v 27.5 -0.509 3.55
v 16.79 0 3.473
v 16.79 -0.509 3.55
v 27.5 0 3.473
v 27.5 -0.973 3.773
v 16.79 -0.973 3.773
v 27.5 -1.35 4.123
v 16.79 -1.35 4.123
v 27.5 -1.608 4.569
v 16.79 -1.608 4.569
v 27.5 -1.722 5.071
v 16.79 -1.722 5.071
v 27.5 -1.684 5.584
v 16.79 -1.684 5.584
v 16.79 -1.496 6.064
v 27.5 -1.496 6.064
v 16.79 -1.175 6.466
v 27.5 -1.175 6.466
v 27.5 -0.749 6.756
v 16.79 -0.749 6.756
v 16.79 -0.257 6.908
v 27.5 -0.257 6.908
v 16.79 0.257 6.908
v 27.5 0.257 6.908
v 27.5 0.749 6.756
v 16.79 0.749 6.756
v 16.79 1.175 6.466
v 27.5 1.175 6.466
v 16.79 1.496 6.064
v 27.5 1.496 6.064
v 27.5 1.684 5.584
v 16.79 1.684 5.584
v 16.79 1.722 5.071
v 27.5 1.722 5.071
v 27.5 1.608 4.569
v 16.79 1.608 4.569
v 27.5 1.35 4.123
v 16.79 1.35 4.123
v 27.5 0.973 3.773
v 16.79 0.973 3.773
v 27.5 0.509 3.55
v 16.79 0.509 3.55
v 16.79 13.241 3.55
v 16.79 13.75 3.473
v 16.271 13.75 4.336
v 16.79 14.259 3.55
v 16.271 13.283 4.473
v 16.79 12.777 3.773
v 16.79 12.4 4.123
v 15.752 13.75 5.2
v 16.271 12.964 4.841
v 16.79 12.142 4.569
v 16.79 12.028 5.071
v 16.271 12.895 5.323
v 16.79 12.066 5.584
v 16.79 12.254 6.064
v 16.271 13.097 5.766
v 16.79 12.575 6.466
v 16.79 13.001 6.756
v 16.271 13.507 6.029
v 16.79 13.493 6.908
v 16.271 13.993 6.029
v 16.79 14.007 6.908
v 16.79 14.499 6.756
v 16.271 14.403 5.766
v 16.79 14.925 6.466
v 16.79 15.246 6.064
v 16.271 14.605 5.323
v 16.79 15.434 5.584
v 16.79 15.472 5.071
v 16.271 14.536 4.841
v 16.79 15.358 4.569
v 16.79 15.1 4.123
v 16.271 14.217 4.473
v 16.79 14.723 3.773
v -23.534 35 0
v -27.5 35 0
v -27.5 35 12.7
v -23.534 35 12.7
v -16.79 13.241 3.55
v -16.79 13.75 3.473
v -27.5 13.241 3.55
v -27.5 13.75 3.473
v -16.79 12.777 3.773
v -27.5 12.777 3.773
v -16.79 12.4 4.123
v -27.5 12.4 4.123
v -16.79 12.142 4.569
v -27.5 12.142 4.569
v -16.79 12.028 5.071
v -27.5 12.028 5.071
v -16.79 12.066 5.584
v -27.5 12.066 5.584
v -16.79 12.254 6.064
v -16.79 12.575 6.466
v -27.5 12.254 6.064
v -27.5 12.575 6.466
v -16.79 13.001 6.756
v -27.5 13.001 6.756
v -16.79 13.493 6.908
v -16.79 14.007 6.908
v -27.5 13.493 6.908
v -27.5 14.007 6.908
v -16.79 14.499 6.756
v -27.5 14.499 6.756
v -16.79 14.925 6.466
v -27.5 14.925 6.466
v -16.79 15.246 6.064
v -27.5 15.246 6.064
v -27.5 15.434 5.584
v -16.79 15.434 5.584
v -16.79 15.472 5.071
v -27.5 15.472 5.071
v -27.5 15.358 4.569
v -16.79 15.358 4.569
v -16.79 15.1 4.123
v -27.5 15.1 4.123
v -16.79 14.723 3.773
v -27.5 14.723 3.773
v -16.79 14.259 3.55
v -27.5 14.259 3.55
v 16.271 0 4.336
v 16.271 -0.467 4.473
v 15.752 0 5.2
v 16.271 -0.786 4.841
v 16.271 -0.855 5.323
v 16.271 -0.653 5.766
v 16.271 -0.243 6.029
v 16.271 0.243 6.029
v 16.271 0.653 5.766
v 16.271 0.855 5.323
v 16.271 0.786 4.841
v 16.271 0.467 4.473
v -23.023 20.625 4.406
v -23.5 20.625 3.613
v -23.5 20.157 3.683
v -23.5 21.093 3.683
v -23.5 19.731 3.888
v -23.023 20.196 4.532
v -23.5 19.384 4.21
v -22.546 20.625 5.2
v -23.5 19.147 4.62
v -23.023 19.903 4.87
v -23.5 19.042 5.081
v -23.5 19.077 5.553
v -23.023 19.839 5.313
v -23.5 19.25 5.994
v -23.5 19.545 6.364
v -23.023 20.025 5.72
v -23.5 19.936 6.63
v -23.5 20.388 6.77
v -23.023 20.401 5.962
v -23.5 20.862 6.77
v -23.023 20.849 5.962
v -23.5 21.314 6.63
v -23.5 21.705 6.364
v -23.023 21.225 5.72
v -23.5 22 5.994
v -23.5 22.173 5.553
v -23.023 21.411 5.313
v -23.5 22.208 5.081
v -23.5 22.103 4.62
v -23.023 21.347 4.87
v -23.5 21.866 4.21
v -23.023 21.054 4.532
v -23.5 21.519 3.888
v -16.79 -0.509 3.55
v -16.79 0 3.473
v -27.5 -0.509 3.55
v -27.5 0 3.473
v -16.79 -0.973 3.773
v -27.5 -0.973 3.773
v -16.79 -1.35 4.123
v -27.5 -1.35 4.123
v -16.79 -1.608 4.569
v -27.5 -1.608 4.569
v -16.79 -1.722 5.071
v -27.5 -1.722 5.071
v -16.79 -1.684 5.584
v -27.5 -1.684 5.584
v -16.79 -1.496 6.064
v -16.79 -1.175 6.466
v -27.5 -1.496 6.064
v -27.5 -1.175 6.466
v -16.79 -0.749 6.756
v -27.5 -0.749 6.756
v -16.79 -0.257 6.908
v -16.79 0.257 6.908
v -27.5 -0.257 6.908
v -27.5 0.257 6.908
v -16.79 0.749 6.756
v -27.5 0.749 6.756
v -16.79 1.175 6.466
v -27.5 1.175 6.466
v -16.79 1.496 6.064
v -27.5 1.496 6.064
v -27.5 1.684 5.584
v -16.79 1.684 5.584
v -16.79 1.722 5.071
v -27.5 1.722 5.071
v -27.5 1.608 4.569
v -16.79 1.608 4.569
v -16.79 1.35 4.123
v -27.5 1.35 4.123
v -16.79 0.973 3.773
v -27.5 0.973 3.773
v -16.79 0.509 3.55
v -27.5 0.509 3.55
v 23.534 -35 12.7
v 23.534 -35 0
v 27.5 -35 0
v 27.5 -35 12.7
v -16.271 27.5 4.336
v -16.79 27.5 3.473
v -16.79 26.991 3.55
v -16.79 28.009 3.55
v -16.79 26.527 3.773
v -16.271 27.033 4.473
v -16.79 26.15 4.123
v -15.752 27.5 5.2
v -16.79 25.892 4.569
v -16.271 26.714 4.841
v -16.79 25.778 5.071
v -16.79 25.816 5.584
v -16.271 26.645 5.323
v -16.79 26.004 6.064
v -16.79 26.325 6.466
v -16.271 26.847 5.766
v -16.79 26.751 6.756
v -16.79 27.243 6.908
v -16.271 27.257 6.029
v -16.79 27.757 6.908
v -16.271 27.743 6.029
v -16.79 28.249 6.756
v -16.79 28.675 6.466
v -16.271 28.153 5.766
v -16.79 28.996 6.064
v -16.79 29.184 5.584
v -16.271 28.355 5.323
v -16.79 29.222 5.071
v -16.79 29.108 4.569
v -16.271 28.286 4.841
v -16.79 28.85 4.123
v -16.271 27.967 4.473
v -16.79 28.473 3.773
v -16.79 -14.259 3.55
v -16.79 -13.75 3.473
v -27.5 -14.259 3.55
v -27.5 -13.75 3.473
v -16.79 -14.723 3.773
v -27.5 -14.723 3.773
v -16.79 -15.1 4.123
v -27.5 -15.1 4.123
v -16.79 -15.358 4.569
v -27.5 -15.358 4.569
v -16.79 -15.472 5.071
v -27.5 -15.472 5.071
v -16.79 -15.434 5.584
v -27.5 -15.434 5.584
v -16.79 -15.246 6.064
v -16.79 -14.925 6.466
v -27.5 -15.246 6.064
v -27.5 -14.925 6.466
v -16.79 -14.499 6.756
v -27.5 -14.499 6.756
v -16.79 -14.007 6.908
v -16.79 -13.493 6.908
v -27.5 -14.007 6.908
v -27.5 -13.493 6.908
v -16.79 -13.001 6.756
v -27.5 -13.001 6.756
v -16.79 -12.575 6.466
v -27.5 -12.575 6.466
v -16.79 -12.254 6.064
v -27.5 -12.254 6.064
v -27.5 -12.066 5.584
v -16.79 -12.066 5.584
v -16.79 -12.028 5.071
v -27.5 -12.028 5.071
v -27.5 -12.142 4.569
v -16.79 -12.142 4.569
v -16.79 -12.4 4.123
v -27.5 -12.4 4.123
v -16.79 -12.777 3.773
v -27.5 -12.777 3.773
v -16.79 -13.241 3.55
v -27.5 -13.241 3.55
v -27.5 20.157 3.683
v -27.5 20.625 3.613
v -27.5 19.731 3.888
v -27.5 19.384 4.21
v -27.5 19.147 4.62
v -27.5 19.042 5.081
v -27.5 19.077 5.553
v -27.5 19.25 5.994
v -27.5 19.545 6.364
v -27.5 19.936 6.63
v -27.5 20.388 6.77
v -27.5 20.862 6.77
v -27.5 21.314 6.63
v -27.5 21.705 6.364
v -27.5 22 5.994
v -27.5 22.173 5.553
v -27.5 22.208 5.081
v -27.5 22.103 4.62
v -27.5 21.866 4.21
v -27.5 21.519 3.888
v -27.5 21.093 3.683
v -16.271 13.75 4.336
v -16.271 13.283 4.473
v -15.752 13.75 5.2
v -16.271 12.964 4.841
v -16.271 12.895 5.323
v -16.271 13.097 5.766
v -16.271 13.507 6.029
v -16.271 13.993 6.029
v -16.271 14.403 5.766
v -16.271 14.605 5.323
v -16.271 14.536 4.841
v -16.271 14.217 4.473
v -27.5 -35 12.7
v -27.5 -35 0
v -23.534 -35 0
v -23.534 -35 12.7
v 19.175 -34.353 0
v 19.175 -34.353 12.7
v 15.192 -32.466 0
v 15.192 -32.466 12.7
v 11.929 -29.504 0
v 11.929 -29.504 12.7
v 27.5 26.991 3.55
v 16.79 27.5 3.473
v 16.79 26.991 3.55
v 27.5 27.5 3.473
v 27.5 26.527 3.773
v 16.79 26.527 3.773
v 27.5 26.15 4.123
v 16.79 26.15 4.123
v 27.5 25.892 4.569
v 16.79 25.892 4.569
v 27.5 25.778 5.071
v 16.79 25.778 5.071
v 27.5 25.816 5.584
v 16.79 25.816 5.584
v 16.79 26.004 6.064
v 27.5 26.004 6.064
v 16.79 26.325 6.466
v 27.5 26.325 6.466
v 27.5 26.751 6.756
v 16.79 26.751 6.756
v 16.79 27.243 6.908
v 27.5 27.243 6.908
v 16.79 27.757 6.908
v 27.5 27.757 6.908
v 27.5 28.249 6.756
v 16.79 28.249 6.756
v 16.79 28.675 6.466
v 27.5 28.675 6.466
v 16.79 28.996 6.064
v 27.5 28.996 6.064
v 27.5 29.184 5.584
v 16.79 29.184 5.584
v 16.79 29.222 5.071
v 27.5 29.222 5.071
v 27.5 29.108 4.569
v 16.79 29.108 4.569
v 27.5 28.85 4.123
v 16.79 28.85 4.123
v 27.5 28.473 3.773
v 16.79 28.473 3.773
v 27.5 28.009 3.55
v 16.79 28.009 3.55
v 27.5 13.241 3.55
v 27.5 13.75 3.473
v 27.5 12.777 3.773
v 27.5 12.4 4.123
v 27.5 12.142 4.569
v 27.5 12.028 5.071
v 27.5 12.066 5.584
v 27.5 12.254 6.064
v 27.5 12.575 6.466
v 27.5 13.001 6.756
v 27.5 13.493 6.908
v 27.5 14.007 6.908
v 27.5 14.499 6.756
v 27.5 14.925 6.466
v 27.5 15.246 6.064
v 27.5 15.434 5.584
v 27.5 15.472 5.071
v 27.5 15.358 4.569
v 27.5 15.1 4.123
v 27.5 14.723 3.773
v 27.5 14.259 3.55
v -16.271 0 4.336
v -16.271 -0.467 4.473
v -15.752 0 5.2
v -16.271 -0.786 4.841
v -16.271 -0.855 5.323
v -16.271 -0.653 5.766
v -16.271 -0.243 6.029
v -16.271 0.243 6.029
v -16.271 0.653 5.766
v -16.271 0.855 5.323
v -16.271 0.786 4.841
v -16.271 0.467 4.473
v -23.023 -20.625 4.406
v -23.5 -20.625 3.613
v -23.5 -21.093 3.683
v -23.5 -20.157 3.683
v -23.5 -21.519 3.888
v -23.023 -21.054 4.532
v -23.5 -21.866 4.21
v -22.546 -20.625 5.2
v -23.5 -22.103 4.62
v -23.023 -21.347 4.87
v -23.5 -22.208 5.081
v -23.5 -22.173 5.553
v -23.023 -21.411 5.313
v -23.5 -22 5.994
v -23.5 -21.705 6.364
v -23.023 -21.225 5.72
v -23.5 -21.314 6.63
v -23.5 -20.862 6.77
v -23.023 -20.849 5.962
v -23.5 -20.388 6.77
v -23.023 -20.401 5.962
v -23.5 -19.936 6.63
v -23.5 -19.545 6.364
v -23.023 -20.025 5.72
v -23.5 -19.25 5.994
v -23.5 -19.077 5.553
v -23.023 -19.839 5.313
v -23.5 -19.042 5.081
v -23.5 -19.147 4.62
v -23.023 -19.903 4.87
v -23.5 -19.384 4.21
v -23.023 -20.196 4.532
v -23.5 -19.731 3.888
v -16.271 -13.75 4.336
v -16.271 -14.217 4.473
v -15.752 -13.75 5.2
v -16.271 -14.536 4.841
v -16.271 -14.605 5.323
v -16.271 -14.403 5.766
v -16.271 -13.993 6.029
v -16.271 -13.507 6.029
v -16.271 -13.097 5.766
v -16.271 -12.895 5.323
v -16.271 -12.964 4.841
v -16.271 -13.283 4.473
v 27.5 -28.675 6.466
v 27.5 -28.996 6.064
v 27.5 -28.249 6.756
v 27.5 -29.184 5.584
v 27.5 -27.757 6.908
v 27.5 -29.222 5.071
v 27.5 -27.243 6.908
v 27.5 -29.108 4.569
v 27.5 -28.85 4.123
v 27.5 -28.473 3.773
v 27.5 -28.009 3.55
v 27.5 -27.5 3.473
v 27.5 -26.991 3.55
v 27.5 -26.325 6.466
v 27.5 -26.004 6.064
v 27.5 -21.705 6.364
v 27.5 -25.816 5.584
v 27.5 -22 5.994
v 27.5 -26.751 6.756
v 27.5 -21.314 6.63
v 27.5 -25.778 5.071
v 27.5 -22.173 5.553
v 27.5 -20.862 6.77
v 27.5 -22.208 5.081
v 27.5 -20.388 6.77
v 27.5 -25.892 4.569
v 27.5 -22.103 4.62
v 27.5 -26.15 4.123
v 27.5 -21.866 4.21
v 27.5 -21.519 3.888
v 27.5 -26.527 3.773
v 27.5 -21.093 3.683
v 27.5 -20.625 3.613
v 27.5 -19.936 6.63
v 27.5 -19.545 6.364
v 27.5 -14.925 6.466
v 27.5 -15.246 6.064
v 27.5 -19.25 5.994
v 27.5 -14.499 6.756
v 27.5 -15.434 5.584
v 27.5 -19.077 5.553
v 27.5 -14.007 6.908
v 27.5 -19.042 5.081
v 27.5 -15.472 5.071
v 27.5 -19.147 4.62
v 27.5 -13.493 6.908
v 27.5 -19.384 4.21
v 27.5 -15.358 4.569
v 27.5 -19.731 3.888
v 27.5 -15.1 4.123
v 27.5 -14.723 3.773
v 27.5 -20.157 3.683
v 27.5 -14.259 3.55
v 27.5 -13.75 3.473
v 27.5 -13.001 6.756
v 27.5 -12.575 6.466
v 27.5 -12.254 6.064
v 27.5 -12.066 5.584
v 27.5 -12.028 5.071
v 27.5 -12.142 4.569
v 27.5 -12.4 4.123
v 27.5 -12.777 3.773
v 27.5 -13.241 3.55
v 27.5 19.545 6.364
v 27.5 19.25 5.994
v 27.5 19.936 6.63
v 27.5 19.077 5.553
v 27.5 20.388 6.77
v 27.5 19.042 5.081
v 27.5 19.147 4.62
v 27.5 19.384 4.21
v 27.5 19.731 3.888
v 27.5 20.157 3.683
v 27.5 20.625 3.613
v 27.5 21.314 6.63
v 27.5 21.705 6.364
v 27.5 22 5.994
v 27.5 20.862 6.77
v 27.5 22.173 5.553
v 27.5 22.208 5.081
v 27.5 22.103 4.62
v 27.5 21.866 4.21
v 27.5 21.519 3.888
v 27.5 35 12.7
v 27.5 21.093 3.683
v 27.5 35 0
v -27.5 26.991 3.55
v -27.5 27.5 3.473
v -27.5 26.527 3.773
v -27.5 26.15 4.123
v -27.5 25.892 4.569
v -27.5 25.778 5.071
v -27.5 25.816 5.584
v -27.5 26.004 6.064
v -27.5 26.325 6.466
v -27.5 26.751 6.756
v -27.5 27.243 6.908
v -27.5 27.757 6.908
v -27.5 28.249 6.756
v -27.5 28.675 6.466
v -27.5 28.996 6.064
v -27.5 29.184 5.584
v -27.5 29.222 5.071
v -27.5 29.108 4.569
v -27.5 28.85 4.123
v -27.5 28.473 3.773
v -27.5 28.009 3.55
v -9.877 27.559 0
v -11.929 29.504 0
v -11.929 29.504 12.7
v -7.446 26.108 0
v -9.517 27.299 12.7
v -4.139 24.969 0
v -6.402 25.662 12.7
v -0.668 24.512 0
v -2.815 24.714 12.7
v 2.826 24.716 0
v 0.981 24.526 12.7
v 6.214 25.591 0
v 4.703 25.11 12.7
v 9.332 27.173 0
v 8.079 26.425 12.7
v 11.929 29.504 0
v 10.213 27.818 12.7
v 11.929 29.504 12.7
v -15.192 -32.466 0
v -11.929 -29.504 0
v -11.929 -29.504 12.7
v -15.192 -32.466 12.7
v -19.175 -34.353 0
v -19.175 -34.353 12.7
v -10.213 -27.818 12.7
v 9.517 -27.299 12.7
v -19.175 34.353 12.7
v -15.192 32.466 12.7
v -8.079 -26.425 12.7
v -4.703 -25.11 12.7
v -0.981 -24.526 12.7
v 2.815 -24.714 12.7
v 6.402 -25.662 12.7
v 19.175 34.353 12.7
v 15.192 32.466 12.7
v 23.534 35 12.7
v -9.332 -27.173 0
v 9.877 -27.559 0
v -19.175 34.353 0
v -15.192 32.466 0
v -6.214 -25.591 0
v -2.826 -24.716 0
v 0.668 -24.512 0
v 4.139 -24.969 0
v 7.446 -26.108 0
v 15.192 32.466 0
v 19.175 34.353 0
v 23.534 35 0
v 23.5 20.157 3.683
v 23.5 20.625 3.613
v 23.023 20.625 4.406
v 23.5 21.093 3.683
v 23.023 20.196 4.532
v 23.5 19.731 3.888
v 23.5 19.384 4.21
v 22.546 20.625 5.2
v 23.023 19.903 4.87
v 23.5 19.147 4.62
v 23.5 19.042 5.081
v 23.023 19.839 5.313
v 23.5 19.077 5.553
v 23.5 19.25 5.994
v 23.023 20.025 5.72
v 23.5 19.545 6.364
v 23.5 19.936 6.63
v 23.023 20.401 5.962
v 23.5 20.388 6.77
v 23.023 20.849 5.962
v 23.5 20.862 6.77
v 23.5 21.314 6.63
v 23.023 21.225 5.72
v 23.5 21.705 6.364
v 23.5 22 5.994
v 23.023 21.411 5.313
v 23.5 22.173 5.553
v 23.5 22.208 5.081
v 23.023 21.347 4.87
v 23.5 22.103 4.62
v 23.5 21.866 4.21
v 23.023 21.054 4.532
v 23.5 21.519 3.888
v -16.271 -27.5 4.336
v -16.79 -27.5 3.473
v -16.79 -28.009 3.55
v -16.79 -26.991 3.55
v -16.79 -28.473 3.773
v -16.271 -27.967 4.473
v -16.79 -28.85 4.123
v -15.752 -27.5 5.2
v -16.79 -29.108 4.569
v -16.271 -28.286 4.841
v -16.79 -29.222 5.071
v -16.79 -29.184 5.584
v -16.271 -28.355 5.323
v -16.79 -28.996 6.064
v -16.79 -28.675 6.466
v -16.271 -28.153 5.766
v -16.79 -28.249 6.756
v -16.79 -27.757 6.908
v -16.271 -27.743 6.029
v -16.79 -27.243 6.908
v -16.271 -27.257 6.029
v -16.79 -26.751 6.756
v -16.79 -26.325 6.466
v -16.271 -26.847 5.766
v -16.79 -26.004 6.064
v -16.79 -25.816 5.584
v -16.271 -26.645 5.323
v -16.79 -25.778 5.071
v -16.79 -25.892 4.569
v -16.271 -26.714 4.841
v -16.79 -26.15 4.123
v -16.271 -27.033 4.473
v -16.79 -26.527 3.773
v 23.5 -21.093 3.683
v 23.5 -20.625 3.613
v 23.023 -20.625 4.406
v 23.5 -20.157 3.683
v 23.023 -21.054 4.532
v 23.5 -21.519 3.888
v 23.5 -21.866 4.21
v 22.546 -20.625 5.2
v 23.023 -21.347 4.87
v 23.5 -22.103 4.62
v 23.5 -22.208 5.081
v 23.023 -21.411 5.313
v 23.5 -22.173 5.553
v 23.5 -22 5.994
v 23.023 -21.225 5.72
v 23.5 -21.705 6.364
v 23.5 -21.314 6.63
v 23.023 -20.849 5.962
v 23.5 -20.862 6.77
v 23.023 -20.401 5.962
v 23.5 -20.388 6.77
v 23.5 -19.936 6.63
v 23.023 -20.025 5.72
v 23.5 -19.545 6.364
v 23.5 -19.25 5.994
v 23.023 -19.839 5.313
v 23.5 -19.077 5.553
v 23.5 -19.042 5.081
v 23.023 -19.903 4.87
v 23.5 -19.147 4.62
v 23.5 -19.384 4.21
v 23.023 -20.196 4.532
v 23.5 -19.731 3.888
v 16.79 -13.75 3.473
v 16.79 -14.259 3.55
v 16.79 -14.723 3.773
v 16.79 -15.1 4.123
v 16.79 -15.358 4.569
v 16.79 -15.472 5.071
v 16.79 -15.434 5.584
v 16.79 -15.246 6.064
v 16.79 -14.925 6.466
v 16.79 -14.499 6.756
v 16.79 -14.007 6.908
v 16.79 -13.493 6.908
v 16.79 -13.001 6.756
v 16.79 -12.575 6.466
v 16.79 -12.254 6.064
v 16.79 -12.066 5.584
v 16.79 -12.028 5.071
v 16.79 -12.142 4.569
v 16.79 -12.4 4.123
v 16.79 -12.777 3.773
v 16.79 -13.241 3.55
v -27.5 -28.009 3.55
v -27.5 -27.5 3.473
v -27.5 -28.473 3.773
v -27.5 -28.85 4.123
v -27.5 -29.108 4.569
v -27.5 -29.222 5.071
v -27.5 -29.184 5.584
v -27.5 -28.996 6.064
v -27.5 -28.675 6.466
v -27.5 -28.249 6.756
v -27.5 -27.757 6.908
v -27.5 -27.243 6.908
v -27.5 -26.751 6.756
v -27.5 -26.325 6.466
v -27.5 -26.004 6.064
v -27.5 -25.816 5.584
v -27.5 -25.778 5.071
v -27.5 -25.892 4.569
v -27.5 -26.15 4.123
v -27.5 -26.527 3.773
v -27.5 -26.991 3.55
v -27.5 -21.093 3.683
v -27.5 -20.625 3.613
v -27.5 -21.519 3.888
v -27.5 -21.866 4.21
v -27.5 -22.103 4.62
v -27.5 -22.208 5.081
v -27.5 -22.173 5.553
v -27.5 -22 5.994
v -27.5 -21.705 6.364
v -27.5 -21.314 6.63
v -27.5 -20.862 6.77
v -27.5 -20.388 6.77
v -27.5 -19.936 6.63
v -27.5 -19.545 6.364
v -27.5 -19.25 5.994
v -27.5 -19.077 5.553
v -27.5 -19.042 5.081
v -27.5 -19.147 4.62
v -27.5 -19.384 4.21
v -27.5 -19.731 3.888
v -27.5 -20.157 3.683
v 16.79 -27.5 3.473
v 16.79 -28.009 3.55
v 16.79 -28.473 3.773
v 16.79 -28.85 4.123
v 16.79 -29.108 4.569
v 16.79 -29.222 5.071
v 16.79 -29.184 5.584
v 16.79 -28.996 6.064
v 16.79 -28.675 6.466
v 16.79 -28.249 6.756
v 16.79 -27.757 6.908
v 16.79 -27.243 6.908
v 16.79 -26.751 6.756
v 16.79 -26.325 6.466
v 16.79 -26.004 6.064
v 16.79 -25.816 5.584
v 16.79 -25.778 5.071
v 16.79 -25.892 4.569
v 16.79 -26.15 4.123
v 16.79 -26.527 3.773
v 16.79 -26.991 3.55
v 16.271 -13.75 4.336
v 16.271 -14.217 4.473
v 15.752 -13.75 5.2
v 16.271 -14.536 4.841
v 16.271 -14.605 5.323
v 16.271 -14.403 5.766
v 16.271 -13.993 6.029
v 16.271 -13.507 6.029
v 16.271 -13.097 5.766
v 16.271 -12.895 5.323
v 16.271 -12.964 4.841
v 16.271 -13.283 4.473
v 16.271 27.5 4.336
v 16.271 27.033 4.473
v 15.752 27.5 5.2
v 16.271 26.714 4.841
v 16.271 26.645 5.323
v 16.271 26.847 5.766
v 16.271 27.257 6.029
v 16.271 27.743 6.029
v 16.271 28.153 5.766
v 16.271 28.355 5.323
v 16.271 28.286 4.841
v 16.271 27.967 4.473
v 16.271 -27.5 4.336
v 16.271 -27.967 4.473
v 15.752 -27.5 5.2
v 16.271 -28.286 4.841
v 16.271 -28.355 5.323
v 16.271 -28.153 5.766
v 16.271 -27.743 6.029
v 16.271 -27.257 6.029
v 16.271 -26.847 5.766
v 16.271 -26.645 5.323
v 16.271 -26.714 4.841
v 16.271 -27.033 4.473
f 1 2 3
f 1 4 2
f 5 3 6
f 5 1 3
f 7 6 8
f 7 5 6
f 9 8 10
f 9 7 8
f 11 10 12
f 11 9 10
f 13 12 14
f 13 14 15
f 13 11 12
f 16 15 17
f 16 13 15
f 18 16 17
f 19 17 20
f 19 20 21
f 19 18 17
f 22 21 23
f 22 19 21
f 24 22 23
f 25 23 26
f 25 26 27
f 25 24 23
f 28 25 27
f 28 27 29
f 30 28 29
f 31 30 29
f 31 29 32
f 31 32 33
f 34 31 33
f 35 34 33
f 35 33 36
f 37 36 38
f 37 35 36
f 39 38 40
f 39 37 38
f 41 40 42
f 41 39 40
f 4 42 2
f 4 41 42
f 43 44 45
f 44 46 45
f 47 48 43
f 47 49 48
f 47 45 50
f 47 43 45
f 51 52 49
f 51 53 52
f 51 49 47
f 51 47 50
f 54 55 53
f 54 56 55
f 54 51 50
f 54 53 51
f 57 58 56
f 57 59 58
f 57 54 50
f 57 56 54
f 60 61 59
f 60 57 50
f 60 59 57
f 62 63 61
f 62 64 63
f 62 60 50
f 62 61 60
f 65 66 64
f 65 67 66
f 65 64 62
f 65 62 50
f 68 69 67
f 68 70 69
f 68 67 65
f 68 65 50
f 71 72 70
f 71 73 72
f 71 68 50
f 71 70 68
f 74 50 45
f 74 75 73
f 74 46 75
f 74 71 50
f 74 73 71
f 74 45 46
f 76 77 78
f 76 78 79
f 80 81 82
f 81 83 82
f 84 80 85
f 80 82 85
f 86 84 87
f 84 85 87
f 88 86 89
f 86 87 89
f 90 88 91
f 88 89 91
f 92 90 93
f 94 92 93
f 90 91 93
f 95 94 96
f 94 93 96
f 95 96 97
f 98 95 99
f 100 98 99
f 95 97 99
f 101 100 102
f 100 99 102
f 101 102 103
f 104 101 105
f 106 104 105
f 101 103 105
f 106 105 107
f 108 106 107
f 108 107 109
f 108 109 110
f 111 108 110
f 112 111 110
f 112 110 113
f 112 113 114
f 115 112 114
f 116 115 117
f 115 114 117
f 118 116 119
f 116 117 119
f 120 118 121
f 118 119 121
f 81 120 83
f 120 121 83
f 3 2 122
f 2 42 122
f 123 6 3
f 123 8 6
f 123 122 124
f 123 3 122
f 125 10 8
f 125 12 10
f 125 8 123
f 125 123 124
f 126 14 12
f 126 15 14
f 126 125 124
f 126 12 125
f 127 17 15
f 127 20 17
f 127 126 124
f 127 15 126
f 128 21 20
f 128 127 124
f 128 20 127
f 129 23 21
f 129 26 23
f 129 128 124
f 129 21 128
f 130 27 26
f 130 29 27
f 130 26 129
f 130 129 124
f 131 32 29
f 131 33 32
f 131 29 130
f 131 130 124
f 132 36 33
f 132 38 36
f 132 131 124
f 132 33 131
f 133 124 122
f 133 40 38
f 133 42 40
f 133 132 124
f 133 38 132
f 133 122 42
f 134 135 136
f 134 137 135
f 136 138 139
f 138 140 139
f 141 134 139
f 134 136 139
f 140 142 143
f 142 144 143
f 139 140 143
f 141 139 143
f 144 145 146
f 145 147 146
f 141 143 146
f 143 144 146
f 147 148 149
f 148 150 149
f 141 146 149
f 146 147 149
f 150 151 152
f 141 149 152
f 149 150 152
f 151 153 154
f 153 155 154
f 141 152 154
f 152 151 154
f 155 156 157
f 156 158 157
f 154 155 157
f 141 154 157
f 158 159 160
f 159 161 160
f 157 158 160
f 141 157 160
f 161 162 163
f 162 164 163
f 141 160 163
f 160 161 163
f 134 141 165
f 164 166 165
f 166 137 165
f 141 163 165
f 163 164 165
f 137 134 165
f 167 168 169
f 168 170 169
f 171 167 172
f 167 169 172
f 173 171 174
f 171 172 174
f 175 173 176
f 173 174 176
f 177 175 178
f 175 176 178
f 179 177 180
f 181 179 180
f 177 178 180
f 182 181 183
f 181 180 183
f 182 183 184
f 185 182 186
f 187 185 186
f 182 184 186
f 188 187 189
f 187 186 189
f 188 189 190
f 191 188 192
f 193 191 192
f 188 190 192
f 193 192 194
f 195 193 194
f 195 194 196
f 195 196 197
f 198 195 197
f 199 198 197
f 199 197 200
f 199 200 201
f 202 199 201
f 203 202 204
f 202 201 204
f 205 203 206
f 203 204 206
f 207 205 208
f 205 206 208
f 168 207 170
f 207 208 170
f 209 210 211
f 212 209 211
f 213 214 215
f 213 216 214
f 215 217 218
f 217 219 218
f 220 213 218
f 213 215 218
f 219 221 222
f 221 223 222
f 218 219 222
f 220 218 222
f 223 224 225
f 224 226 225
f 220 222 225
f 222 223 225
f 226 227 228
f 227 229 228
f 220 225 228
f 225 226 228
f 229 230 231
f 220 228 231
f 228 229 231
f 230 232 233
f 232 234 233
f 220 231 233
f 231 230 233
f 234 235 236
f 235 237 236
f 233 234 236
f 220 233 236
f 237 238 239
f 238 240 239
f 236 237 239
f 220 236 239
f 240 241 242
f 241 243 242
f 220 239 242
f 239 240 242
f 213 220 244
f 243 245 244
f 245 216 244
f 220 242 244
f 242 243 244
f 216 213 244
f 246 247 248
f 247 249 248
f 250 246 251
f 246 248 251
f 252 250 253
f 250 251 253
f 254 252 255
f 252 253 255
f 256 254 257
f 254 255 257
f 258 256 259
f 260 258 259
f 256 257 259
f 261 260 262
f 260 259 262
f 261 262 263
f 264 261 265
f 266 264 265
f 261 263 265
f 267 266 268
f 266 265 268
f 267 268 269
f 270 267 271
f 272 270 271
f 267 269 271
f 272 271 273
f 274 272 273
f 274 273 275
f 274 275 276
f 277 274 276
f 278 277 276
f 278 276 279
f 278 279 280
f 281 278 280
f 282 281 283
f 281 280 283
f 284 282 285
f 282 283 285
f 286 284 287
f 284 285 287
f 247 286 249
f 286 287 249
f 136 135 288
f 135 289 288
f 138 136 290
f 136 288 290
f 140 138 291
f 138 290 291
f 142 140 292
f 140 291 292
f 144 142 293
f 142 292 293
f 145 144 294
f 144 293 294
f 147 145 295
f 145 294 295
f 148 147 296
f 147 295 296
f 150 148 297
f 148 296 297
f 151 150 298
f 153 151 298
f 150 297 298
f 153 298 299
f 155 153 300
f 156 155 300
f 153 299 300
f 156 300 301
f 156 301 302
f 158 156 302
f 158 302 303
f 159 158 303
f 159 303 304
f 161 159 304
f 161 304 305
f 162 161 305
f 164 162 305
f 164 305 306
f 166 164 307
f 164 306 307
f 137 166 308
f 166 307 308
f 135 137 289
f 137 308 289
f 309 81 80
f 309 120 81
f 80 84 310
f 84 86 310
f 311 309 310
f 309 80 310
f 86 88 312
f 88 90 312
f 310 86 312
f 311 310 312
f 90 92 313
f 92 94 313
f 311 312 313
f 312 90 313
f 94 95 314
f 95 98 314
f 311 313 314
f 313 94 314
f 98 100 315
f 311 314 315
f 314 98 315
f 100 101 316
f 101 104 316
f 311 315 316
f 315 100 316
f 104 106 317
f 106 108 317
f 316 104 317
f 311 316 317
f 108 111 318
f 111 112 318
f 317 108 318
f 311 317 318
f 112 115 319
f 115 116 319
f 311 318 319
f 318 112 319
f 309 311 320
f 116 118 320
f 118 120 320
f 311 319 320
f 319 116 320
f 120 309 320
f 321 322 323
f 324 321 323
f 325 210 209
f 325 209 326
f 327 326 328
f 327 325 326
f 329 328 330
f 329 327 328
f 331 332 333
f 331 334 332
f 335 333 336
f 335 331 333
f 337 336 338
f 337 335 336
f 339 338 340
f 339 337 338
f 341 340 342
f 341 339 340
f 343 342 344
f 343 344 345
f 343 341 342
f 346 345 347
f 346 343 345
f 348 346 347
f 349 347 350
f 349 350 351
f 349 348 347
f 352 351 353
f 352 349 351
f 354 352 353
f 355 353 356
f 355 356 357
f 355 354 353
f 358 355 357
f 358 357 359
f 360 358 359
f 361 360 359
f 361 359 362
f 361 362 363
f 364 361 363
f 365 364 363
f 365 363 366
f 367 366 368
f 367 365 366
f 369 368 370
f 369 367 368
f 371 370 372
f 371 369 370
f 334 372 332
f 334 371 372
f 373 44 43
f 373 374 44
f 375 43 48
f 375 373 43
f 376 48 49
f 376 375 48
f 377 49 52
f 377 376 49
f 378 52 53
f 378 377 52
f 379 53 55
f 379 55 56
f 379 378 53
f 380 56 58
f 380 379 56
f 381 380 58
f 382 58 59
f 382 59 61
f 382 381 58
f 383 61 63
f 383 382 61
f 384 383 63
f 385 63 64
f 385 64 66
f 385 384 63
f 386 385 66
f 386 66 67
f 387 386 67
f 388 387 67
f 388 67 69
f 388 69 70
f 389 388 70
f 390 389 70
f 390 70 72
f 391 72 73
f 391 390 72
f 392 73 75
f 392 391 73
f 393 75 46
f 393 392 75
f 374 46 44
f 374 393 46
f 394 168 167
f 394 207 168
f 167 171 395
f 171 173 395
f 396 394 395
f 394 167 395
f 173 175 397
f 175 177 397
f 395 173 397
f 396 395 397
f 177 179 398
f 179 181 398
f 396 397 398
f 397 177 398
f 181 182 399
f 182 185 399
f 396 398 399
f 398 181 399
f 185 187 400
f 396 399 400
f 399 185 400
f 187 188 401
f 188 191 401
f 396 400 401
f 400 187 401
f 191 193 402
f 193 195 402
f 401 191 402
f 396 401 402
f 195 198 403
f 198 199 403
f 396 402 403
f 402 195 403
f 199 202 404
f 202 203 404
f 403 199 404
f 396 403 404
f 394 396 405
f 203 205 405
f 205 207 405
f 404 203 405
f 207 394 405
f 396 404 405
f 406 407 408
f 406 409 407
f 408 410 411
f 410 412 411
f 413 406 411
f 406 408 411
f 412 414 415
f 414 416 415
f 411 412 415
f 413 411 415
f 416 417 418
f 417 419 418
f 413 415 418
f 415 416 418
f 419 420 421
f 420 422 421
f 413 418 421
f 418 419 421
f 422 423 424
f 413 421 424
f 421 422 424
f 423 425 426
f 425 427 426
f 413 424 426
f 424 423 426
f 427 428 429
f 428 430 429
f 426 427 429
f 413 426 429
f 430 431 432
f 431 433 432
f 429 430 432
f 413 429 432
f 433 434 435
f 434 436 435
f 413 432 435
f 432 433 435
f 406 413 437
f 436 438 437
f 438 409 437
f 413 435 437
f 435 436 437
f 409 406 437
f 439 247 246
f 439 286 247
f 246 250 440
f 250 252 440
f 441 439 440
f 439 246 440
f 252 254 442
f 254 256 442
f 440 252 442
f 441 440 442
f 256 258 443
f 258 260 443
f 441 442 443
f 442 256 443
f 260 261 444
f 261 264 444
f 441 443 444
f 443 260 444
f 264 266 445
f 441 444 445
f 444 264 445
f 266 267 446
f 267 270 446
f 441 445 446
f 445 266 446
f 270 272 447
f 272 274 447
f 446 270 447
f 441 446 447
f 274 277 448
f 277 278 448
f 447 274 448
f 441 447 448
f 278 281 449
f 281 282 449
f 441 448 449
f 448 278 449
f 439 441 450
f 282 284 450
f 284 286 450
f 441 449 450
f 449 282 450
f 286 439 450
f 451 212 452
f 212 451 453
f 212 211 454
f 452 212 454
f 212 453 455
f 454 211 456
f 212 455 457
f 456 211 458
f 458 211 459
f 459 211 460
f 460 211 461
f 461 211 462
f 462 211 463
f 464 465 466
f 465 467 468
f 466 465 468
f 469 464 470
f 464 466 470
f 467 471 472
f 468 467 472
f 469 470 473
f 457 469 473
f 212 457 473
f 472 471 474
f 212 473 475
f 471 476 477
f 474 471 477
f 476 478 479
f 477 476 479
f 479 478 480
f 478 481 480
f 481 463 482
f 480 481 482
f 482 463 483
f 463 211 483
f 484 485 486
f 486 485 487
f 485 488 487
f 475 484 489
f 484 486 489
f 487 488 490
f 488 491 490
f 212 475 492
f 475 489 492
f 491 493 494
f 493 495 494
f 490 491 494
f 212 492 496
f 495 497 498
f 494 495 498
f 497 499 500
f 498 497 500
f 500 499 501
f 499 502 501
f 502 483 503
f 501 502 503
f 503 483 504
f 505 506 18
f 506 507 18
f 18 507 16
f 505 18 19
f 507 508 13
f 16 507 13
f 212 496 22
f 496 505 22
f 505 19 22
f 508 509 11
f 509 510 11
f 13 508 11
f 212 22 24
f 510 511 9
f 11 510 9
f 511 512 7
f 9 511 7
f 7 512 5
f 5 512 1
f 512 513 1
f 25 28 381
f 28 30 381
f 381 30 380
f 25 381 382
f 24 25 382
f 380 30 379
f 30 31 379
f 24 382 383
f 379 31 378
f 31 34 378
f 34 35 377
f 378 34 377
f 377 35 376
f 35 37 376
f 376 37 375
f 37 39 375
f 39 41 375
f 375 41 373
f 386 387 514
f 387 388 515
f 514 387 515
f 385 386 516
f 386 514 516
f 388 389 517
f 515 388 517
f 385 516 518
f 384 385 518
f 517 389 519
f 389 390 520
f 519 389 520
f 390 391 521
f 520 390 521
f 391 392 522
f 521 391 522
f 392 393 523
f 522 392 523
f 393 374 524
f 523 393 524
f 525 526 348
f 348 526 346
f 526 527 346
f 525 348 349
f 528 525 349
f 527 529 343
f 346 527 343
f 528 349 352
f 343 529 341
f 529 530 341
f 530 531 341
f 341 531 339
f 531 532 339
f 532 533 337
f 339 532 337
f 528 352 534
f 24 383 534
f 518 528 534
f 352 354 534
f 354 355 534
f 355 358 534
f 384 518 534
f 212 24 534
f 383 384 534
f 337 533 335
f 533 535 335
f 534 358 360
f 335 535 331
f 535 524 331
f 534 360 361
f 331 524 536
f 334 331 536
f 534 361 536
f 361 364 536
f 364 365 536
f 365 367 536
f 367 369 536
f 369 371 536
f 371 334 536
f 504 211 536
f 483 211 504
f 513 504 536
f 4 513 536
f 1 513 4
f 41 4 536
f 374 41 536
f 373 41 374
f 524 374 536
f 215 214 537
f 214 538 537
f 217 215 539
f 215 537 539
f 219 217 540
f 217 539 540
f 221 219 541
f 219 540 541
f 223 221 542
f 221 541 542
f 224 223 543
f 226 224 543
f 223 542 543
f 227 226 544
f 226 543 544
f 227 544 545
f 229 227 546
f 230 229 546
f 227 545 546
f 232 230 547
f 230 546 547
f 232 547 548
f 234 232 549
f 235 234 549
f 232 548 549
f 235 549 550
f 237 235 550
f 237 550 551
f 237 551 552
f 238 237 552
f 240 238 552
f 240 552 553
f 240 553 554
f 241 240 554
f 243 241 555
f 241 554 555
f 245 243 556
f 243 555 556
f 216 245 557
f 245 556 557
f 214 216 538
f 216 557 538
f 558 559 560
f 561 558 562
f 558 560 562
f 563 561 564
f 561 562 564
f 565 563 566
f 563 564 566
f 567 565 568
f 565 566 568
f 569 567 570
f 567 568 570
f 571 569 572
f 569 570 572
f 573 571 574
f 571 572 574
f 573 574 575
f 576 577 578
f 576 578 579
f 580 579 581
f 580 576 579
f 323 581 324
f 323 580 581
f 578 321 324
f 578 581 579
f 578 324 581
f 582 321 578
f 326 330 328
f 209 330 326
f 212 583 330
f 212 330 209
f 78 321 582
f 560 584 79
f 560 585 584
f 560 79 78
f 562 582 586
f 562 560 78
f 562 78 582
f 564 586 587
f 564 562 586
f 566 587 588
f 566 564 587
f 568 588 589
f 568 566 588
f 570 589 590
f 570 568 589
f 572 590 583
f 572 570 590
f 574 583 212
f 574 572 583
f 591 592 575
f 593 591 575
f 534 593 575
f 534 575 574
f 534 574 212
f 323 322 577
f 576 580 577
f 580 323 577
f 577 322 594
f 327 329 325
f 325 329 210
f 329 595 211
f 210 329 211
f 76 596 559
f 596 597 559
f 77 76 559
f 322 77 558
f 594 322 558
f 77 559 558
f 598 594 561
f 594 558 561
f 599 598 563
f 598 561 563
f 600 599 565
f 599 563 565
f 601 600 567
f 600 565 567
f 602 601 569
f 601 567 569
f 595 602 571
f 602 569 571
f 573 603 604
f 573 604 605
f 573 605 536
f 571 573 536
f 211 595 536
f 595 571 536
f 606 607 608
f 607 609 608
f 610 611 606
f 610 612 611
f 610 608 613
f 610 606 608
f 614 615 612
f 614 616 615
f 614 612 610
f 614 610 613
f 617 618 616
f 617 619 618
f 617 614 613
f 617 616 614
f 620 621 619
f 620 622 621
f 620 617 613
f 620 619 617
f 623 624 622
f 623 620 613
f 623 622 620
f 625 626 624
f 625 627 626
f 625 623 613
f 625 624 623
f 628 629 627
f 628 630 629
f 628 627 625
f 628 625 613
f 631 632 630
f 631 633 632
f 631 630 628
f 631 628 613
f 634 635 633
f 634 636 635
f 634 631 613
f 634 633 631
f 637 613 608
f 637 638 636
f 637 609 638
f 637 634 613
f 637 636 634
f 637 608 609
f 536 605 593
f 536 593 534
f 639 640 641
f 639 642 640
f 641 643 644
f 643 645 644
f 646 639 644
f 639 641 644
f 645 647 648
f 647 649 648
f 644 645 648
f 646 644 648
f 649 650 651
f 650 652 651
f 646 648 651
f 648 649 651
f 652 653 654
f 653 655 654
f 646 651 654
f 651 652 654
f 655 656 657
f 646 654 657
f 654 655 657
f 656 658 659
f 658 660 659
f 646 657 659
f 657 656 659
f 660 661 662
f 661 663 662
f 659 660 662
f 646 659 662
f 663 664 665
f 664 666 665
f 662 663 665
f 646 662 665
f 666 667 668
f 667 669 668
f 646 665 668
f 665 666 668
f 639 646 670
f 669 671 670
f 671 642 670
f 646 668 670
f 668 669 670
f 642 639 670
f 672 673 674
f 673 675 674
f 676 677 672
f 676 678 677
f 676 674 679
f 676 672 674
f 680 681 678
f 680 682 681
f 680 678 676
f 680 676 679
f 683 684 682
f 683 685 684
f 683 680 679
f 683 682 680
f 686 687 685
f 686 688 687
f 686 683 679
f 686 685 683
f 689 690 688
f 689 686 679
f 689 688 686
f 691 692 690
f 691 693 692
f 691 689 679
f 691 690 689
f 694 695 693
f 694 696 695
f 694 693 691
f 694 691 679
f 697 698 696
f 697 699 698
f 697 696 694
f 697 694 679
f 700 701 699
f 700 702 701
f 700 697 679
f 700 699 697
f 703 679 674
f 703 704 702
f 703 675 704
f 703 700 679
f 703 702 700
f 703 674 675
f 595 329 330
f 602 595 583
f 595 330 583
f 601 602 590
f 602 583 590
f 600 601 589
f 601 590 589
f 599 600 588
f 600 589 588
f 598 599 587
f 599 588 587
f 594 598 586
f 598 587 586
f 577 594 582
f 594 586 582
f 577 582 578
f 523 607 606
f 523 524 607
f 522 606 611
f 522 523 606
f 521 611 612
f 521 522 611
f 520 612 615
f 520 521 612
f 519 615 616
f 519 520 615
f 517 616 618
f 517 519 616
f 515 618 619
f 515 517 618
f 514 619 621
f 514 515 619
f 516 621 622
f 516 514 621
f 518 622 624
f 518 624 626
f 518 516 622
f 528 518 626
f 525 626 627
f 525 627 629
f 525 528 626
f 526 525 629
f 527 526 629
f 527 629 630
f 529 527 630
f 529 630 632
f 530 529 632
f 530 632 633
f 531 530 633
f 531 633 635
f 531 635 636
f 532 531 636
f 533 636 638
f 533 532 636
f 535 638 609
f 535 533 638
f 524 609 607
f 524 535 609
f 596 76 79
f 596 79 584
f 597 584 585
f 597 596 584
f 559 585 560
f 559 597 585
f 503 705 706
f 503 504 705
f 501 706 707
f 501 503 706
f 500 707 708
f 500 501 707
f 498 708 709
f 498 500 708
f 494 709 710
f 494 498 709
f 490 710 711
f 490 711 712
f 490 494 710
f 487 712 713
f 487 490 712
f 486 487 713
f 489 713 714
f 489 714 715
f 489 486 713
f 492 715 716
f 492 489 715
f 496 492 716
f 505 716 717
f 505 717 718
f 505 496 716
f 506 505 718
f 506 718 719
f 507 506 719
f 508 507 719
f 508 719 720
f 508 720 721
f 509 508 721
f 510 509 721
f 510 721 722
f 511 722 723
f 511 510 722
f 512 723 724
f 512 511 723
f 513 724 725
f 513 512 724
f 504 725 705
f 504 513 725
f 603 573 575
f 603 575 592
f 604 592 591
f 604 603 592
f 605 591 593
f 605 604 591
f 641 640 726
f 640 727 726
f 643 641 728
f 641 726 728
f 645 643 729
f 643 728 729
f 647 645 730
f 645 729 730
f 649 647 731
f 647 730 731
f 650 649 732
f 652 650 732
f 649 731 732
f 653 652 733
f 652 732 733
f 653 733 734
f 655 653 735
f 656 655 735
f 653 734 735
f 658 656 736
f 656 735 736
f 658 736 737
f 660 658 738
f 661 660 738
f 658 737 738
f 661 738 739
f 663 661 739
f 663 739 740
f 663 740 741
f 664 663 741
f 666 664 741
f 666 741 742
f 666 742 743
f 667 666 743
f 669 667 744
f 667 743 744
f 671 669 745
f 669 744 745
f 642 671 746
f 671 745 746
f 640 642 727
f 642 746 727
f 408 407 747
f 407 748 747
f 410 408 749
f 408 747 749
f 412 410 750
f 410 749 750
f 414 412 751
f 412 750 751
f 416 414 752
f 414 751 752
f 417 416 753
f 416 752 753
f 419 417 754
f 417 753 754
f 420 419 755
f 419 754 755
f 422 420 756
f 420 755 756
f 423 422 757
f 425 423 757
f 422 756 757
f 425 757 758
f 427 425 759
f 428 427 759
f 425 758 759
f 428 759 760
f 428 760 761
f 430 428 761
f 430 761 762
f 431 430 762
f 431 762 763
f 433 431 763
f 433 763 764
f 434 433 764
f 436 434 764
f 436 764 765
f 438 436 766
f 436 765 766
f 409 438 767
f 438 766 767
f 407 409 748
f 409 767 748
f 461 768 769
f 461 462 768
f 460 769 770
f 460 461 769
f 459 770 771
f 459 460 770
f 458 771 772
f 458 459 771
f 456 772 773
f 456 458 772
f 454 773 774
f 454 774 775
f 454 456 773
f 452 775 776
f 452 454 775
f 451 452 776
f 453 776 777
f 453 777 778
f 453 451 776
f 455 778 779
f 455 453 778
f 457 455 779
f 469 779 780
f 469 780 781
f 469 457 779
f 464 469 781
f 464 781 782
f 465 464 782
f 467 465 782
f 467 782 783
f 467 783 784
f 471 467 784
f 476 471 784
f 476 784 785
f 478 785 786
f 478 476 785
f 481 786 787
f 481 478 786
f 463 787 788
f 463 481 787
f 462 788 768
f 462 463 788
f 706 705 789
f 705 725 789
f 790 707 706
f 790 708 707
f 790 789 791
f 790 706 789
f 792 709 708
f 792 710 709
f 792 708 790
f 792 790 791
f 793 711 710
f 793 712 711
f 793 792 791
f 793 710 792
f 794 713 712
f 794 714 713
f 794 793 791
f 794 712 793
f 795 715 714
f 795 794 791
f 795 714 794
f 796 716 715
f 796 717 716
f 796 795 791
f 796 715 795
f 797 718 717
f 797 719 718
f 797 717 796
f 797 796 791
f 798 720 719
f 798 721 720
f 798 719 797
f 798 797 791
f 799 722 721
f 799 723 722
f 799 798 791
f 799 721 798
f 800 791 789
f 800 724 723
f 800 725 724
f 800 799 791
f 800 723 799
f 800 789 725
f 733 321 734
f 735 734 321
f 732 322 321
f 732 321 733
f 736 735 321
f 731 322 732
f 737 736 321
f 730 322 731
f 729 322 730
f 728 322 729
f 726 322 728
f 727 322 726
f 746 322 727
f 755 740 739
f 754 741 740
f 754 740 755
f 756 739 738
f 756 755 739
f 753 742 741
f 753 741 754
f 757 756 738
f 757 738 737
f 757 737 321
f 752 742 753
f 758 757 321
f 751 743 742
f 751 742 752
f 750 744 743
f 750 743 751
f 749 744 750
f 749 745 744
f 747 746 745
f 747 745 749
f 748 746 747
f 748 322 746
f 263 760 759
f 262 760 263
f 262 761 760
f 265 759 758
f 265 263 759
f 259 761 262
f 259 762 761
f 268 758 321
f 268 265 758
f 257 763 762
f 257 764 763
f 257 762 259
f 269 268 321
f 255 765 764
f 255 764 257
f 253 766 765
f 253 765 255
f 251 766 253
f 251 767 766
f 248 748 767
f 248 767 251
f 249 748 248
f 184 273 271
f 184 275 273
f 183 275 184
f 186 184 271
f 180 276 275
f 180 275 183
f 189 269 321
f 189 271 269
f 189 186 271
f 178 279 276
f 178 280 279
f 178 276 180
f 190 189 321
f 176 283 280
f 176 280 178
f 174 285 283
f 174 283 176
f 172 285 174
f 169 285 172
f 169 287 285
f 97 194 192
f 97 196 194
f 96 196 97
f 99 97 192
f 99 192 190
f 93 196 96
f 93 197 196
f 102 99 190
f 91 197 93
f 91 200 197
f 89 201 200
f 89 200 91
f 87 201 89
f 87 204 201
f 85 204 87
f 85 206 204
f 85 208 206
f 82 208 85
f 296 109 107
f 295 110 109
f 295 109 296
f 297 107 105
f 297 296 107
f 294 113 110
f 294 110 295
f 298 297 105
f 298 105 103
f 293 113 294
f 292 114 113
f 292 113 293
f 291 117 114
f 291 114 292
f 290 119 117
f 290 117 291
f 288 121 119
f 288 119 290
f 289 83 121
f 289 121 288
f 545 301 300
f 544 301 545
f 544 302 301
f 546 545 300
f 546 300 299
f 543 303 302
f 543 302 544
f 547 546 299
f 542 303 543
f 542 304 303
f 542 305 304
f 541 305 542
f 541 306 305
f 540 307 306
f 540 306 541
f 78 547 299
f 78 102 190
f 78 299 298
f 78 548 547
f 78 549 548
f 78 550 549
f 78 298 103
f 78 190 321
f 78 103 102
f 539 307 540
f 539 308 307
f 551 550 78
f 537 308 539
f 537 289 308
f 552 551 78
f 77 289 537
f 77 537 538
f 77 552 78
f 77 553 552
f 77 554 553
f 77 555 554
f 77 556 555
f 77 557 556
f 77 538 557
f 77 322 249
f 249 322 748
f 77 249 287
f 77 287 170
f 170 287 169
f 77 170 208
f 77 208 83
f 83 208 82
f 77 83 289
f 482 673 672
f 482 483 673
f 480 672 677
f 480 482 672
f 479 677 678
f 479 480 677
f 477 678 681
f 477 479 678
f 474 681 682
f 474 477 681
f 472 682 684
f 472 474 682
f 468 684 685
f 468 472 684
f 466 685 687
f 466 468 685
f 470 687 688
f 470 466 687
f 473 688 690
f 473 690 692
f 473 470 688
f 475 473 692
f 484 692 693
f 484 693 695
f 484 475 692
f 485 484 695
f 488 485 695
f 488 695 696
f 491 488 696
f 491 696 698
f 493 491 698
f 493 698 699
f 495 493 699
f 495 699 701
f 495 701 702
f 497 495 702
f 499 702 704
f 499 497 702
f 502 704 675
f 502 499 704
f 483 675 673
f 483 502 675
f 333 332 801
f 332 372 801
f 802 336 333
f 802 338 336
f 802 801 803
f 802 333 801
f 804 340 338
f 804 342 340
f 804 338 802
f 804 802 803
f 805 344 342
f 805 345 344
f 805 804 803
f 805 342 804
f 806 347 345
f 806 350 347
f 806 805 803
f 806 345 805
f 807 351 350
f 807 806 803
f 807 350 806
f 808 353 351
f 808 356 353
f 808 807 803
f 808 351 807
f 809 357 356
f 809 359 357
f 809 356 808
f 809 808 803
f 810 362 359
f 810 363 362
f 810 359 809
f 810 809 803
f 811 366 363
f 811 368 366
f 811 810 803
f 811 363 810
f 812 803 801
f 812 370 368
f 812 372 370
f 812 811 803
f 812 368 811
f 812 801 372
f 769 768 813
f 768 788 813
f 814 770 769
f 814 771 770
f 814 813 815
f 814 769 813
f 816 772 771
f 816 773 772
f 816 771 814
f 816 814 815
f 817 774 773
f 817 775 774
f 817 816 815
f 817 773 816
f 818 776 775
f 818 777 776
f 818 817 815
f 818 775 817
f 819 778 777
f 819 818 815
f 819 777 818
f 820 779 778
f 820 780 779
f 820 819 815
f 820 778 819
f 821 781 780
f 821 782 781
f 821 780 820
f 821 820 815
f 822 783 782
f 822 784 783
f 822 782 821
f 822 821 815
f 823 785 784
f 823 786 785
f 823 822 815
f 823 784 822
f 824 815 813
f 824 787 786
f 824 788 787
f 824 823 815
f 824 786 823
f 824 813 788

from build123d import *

# Parameters (mm, degrees)
SKETCH1_W                           = 55
SKETCH1_H                           = 70
BOSS_EXTRUDE1_DEPTH                 = 12.7
SKETCH21_RX                         = 14
SKETCH21_RY                         = 10.5
CUT_EXTRUDE1_DEPTH                  = 47.287579328
FILLET2_START                       = -1
FILLET2_DEPTH                       = 15
F_8_32_TAPPED_HOLE1_AT_2_COUNT      = 2
F_8_32_TAPPED_HOLE1_AT_2_PITCH      = 13.75
F_8_32_TAPPED_HOLE1_AT_3_COUNT      = 2
F_8_32_TAPPED_HOLE1_AT_3_PITCH      = 27.5
F_8_32_TAPPED_HOLE1_AT_4_COUNT      = 2
F_8_32_TAPPED_HOLE1_AT_4_PITCH      = 55
F_8_32_TAPPED_HOLE1_AT_5_COUNT      = 2
F_8_32_TAPPED_HOLE1_AT_5_PITCH      = 41.25
F_1_8_0_1250_DOWEL_HOLE1_AT_2_COUNT = 2
F_1_8_0_1250_DOWEL_HOLE1_AT_2_PITCH = 41.25


with BuildPart() as part:
    # Sketch1 → Boss-Extrude1 (new body)
    with BuildSketch(Plane.XY):
        Rectangle(SKETCH1_W, SKETCH1_H)
    extrude(amount=BOSS_EXTRUDE1_DEPTH)

    # Sketch21 → Cut-Extrude1 (cut, through all)
    with BuildSketch(Plane.XY.offset(12.7)):
        with Locations((0, 35)):
            Ellipse(SKETCH21_RX, SKETCH21_RY)
        with Locations((0, -35)):
            Ellipse(SKETCH21_RX, SKETCH21_RY)
    extrude(amount=-CUT_EXTRUDE1_DEPTH, mode=Mode.SUBTRACT)

    # Fillet2: read off the stored shape, not the designer's step
    # Fillet2 outline → Fillet2 (cut)
    with BuildSketch(Plane.XY.offset(FILLET2_START)):
        with BuildLine():
            ThreePointArc((-23.533885883, 35), (-17.113783845, 33.556632687), (-11.929223863, 29.504305309))
            add(Edge.make_bspline(
                [(-14, 35), (-14, 32.032702325), (-11.929223863, 29.504305309)],
                knots=[3.141592654, 3.141592654, 3.141592654, 3.703586408, 3.703586408, 3.703586408], degree=2, weights=[1, 0.895209737, 0.865402427]))
            Line((-14, 35), (-23.533885883, 35))
        make_face()
        with BuildLine():
            add(Edge.make_bspline(
                [(11.929223863, 29.504305309), (14, 32.032702325), (14, 35)],
                knots=[5.721191552, 5.721191552, 5.721191552, 6.283185307, 6.283185307, 6.283185307], degree=2, weights=[0.865402427, 0.895209737, 1]))
            ThreePointArc((11.929223863, 29.504305309), (17.113783845, 33.556632687), (23.533885883, 35))
            Line((23.533885883, 35), (14, 35))
        make_face()
        with BuildLine():
            ThreePointArc((23.533885883, -35), (17.113783845, -33.556632687), (11.929223863, -29.504305309))
            add(Edge.make_bspline(
                [(14, -35), (14, -32.032702325), (11.929223863, -29.504305309)],
                knots=[0, 0, 0, 0.561993755, 0.561993755, 0.561993755], degree=2, weights=[1, 0.895209737, 0.865402427]))
            Line((14, -35), (23.533885883, -35))
        make_face()
        with BuildLine():
            add(Edge.make_bspline(
                [(-11.929223863, -29.504305309), (-14, -32.032702325), (-14, -35)],
                knots=[2.579598899, 2.579598899, 2.579598899, 3.141592654, 3.141592654, 3.141592654], degree=2, weights=[0.865402427, 0.895209737, 1]))
            ThreePointArc((-11.929223863, -29.504305309), (-17.113783845, -33.556632687), (-23.533885883, -35))
            Line((-23.533885883, -35), (-14, -35))
        make_face()
    extrude(amount=FILLET2_DEPTH, mode=Mode.SUBTRACT)

    # Sketch16 → #8-32 Tapped Hole1 (revolve, cut)
    with BuildSketch(Plane(origin=(27.5, -27.5, 5.2), x_dir=(0, 0, -1), z_dir=(0, 1, 0))):
        Polygon((0, 0), (0, 11.747806461), (1.7272, 10.71), (1.7272, 0), align=None)
    f_8_32_tapped_hole1 = revolve(axis=Axis((33.85, -27.5, 5.2), (-1, 0, 0)), mode=Mode.SUBTRACT)

    # #8-32 Tapped Hole1 at 2: #8-32 Tapped Hole1 ×2
    with Locations(*[(0, i * F_8_32_TAPPED_HOLE1_AT_2_PITCH, 0) for i in range(1, F_8_32_TAPPED_HOLE1_AT_2_COUNT)]):
        add(f_8_32_tapped_hole1, mode=Mode.SUBTRACT)

    # #8-32 Tapped Hole1 at 3: #8-32 Tapped Hole1 ×2
    with Locations(*[(0, i * F_8_32_TAPPED_HOLE1_AT_3_PITCH, 0) for i in range(1, F_8_32_TAPPED_HOLE1_AT_3_COUNT)]):
        add(f_8_32_tapped_hole1, mode=Mode.SUBTRACT)

    # #8-32 Tapped Hole1 at 4: #8-32 Tapped Hole1 ×2
    with Locations(*[(0, i * F_8_32_TAPPED_HOLE1_AT_4_PITCH, 0) for i in range(1, F_8_32_TAPPED_HOLE1_AT_4_COUNT)]):
        add(f_8_32_tapped_hole1, mode=Mode.SUBTRACT)

    # #8-32 Tapped Hole1 at 5: #8-32 Tapped Hole1 ×2
    with Locations(*[(0, i * F_8_32_TAPPED_HOLE1_AT_5_PITCH, 0) for i in range(1, F_8_32_TAPPED_HOLE1_AT_5_COUNT)]):
        add(f_8_32_tapped_hole1, mode=Mode.SUBTRACT)

    # Sketch20 → 1/8 (0.1250) Dowel Hole1 (revolve, cut)
    with BuildSketch(Plane(origin=(27.5, -20.625, 5.2), x_dir=(0, 0, -1), z_dir=(0, 1, 0))):
        Polygon((0, 0), (0, 4.953866233), (1.5875, 4), (1.5875, 0), align=None)
    f_1_8_0_1250_dowel_hole1 = revolve(axis=Axis((33.85, -20.625, 5.2), (-1, 0, 0)), mode=Mode.SUBTRACT)

    # 1/8 (0.1250) Dowel Hole1 at 2: 1/8 (0.1250) Dowel Hole1 ×2
    with Locations(*[(0, i * F_1_8_0_1250_DOWEL_HOLE1_AT_2_PITCH, 0) for i in range(1, F_1_8_0_1250_DOWEL_HOLE1_AT_2_COUNT)]):
        add(f_1_8_0_1250_dowel_hole1, mode=Mode.SUBTRACT)

    # Mirror1: #8-32 Tapped Hole1, 1/8 (0.1250) Dowel Hole1 across plane
    add(f_8_32_tapped_hole1.mirror(Plane(origin=(0, 0, 0), x_dir=(0, 0, 1), z_dir=(1, 0, 0))), mode=Mode.SUBTRACT)
    add(f_1_8_0_1250_dowel_hole1.mirror(Plane(origin=(0, 0, 0), x_dir=(0, 0, 1), z_dir=(1, 0, 0))), mode=Mode.SUBTRACT)

    # Mirror1 copy 1 sketch → Mirror1 copy 1 (revolve, cut)
    with BuildSketch(Plane(origin=(-27.5, -13.75, 5.2), x_dir=(0, 0, -1), z_dir=(0, 1, 0))):
        Polygon((0, 0), (0, -11.747806461), (1.7272, -10.71), (1.7272, 0), align=None)
    revolve(axis=Axis((-33.85, -13.75, 5.2), (-1, 0, 0)), mode=Mode.SUBTRACT)

    # Mirror1 copy 2 sketch → Mirror1 copy 2 (revolve, cut)
    with BuildSketch(Plane(origin=(-27.5, 0, 5.2), x_dir=(0, 0, -1), z_dir=(0, 1, 0))):
        Polygon((0, 0), (0, -11.747806461), (1.7272, -10.71), (1.7272, 0), align=None)
    revolve(axis=Axis((-33.85, 0, 5.2), (-1, 0, 0)), mode=Mode.SUBTRACT)

    # Mirror1 copy 3 sketch → Mirror1 copy 3 (revolve, cut)
    with BuildSketch(Plane(origin=(-27.5, 27.5, 5.2), x_dir=(0, 0, -1), z_dir=(0, 1, 0))):
        Polygon((0, 0), (0, -11.747806461), (1.7272, -10.71), (1.7272, 0), align=None)
    revolve(axis=Axis((-33.85, 27.5, 5.2), (-1, 0, 0)), mode=Mode.SUBTRACT)

    # Mirror1 copy 4 sketch → Mirror1 copy 4 (revolve, cut)
    with BuildSketch(Plane(origin=(-27.5, 13.75, 5.2), x_dir=(0, 0, -1), z_dir=(0, 1, 0))):
        Polygon((0, 0), (0, -11.747806461), (1.7272, -10.71), (1.7272, 0), align=None)
    revolve(axis=Axis((-33.85, 13.75, 5.2), (-1, 0, 0)), mode=Mode.SUBTRACT)

    # Mirror1 copy 5 sketch → Mirror1 copy 5 (revolve, cut)
    with BuildSketch(Plane(origin=(-27.5, 20.625, 5.2), x_dir=(0, 0, -1), z_dir=(0, 1, 0))):
        Polygon((0, 0), (0, -4.953866233), (1.5875, -4), (1.5875, 0), align=None)
    revolve(axis=Axis((-33.85, 20.625, 5.2), (-1, 0, 0)), mode=Mode.SUBTRACT)


solid = part.part
